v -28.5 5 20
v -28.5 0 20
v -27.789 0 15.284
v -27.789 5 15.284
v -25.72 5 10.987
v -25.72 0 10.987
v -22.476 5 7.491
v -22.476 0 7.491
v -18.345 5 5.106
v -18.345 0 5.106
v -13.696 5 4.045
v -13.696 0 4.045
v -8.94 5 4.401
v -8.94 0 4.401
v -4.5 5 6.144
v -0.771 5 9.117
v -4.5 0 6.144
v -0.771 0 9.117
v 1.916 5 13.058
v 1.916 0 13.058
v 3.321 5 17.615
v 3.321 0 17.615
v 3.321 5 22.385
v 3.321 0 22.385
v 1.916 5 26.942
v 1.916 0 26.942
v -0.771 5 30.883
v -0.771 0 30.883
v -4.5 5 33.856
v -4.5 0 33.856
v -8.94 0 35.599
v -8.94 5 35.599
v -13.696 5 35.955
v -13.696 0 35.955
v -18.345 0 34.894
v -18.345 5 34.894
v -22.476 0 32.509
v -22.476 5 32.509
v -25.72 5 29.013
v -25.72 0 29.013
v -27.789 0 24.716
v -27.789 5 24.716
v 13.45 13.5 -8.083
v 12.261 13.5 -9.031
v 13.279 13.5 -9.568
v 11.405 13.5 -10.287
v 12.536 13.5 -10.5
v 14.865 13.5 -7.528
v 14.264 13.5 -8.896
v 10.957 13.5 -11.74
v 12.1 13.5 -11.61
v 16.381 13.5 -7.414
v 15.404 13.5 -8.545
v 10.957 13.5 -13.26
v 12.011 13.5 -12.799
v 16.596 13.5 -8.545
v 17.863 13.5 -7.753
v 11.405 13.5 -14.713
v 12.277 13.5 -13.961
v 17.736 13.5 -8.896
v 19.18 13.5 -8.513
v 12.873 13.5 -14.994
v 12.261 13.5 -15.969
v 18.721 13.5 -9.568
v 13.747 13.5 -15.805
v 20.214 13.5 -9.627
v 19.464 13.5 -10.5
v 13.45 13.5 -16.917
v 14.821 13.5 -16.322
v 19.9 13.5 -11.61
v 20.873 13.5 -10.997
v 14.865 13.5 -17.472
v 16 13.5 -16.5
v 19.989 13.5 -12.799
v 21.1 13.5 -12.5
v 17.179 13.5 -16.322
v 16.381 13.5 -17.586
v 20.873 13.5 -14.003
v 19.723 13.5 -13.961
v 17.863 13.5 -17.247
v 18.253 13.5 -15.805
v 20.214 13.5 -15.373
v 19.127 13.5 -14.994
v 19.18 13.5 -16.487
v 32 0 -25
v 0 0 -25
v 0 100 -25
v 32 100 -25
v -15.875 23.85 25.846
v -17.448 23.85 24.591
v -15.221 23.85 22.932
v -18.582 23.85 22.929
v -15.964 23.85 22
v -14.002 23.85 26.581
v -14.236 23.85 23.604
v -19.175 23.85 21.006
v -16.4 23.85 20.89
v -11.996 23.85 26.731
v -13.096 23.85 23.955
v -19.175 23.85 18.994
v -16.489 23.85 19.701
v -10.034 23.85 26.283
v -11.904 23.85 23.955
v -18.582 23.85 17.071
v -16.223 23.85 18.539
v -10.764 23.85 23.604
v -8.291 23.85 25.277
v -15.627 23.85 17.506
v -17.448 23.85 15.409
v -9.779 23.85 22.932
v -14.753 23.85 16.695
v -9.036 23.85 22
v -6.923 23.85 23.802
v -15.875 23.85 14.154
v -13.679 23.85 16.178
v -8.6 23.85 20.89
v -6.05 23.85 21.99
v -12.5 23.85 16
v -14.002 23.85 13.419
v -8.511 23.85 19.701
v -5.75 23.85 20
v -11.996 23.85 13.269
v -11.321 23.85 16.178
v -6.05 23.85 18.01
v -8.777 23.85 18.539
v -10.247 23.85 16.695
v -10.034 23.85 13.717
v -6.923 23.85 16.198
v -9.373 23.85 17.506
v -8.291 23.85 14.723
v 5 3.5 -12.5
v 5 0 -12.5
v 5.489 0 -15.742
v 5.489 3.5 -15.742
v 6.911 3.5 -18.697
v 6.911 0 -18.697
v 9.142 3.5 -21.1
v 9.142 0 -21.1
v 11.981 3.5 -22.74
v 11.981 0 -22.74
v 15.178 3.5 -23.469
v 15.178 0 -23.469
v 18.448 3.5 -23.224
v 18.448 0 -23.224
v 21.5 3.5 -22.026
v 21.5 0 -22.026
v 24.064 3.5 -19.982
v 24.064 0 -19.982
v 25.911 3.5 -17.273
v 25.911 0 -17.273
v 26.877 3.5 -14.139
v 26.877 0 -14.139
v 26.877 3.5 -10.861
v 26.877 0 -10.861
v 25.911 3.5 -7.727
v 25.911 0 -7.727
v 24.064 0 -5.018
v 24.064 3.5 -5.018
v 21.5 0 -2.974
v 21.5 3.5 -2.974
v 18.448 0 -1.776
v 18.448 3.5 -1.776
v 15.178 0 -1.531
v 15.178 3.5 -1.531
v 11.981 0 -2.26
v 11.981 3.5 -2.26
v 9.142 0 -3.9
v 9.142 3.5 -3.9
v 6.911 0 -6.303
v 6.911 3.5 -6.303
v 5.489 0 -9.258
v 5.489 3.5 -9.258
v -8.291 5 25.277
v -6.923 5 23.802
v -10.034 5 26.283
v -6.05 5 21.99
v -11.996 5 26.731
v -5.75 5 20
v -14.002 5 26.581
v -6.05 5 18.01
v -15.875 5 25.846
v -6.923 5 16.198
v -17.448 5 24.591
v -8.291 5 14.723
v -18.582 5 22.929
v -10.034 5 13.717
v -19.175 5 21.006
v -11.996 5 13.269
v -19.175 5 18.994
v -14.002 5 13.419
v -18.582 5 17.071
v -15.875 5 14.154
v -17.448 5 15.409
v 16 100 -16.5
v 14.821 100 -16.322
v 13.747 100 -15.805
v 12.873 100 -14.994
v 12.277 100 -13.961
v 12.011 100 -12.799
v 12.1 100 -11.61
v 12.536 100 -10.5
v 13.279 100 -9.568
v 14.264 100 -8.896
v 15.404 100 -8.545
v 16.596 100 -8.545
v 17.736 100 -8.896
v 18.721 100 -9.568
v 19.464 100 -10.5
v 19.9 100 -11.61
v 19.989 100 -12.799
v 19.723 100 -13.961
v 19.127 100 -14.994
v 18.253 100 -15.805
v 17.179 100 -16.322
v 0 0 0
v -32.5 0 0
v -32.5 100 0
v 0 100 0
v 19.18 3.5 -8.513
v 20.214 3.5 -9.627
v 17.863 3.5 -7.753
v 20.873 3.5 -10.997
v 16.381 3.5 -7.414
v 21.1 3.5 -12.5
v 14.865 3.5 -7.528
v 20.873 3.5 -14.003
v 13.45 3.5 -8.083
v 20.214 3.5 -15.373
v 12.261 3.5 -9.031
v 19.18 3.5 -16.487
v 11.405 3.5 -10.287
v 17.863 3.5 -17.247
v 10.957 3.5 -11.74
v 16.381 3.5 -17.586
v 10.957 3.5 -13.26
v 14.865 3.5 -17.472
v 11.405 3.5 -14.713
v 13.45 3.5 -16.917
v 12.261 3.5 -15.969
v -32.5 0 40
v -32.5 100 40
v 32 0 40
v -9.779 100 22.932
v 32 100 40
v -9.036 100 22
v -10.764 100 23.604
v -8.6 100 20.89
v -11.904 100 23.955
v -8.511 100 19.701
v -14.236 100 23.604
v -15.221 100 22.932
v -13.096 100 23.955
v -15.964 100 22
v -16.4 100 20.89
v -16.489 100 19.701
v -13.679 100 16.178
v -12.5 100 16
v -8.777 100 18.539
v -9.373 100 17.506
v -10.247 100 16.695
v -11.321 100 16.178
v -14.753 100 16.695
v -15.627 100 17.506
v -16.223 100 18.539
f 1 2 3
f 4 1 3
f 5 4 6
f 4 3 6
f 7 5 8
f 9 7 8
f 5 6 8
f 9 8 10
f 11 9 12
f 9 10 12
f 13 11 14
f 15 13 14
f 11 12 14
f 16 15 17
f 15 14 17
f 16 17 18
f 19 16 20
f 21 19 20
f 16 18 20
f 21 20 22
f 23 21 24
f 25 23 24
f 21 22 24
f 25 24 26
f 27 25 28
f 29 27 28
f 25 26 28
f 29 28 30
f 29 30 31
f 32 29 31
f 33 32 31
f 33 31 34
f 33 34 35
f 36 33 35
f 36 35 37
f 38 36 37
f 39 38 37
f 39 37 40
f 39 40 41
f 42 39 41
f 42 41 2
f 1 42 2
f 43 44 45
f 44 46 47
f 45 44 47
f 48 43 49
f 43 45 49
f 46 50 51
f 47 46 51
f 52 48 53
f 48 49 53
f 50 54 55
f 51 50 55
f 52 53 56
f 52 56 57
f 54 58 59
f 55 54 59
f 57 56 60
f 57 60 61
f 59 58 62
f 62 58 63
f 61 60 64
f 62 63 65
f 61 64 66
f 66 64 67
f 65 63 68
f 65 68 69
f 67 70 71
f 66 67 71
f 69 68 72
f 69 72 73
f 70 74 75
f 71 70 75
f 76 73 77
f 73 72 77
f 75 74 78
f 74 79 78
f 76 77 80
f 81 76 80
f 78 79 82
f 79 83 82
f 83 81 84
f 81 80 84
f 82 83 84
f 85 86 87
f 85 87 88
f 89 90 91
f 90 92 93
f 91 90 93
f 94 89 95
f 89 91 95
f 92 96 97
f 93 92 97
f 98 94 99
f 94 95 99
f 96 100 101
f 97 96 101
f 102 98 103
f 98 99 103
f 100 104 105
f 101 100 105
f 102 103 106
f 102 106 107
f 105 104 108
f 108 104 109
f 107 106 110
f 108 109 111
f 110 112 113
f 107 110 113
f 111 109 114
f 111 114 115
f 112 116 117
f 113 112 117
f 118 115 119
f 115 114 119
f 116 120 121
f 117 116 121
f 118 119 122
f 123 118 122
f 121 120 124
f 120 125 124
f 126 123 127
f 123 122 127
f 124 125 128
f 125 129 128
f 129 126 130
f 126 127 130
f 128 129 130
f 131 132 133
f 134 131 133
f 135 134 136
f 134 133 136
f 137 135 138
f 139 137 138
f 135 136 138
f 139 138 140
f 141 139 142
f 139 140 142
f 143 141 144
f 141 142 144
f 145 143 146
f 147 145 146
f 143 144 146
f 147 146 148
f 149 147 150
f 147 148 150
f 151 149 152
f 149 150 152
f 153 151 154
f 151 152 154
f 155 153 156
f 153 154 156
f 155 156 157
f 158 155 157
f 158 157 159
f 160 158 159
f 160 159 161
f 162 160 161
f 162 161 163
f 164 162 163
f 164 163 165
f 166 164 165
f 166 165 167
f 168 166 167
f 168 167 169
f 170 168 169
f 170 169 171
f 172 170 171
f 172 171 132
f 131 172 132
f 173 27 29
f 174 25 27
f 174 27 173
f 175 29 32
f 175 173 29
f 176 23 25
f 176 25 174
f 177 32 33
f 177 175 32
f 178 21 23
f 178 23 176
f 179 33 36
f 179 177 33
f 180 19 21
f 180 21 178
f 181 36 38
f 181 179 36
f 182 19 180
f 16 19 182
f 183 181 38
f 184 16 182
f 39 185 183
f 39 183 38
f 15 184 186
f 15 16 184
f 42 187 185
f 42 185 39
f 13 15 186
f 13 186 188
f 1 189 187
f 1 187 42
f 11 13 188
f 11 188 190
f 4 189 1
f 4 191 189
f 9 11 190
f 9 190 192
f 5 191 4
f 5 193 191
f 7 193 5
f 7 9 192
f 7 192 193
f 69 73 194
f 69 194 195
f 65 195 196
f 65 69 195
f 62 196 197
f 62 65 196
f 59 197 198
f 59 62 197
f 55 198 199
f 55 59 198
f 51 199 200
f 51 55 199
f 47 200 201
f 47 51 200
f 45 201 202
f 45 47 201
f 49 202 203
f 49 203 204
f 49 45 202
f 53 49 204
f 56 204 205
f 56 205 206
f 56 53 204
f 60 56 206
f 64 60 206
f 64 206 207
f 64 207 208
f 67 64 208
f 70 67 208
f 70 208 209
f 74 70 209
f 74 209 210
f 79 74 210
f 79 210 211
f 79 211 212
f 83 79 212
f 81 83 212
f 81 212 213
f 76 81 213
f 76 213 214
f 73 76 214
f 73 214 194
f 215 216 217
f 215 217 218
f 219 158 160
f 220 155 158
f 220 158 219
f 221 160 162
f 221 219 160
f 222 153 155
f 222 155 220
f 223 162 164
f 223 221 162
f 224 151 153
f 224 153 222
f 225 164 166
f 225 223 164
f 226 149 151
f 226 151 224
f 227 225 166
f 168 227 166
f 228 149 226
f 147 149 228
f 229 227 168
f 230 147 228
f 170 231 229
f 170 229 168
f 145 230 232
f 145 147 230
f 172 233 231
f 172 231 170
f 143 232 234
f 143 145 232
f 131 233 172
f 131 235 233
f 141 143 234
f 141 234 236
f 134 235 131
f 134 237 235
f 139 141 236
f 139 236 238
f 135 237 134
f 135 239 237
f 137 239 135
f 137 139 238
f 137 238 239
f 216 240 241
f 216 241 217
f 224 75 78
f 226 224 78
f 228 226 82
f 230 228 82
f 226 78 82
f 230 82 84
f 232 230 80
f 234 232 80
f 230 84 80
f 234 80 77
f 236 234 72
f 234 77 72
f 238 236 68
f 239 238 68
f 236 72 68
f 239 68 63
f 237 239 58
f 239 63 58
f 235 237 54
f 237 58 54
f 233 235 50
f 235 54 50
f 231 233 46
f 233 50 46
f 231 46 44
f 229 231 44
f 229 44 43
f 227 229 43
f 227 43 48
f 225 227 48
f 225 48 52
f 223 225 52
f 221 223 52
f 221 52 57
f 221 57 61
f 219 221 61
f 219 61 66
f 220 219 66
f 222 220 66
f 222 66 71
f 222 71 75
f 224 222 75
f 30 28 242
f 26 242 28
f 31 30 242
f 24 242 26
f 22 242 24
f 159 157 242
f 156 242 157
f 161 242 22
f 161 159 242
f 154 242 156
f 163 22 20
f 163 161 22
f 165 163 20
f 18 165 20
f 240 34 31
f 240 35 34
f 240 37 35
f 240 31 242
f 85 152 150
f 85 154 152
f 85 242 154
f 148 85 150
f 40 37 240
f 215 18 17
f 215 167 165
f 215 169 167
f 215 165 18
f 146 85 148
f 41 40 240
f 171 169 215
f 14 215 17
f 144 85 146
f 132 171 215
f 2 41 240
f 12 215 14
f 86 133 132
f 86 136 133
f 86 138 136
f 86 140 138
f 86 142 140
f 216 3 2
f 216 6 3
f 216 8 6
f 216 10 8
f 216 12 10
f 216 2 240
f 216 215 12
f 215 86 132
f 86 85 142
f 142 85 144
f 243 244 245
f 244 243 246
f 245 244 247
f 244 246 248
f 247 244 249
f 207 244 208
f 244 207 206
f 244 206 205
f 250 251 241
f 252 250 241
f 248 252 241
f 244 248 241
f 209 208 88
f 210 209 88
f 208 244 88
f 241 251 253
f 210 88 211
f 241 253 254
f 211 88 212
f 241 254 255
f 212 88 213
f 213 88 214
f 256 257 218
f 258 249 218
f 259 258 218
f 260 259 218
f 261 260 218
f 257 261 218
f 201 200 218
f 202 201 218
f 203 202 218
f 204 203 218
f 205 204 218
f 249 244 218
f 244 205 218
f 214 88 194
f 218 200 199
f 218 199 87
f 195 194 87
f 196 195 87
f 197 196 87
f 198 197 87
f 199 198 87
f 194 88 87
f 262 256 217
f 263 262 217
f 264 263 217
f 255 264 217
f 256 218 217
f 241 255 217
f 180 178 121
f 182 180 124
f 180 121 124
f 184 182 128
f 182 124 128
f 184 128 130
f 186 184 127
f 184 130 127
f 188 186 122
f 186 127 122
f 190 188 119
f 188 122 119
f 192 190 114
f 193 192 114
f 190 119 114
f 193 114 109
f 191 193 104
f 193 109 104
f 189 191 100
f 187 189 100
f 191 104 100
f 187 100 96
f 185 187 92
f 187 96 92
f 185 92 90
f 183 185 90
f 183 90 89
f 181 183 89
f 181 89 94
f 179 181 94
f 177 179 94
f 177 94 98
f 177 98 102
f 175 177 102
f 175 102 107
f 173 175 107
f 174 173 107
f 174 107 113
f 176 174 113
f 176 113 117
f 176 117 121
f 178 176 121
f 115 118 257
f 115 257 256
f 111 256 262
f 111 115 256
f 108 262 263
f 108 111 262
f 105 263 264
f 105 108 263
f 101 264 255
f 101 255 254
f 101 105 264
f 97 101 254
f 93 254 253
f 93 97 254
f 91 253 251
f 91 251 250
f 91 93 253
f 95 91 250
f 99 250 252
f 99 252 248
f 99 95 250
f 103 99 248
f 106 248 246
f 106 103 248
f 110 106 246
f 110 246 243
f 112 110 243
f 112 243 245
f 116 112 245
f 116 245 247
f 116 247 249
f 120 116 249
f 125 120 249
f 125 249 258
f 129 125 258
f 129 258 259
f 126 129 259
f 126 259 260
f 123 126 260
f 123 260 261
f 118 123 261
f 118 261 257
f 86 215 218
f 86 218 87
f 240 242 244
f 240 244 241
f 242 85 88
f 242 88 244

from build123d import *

# Parameters (mm, degrees)
SKETCH1_R                               = 4
BOSS_EXTRUDE1_DEPTH                     = 100
CBORE_FOR_M5_HEX_HEAD_BOLT2_D           = 13.5
CBORE_FOR_M5_HEX_HEAD_BOLT2_DEPTH       = 23.85
CBORE_FOR_M5_HEX_HEAD_BOLT2_CBORE_D     = 32
CBORE_FOR_M5_HEX_HEAD_BOLT2_CBORE_DEPTH = 5
CBORE_FOR_M5_HEX_HEAD_BOLT3_D           = 10.2
CBORE_FOR_M5_HEX_HEAD_BOLT3_DEPTH       = 13.5
CBORE_FOR_M5_HEX_HEAD_BOLT3_CBORE_D     = 22
CBORE_FOR_M5_HEX_HEAD_BOLT3_CBORE_DEPTH = 3.5


with BuildPart() as part:
    # Sketch1 → Boss-Extrude1 (new body)
    with BuildSketch(Plane(origin=(0, 0, 0), x_dir=(1, 0, 0), z_dir=(0, 1, 0))):
        Polygon((-32.5, 0), (0, 0), (0, 25), (32, 25), (32, -40), (-32.5, -40), align=None)
        with Locations(Location((-12.5, -20, 0), (0, 0, 90))):
            Circle(SKETCH1_R, mode=Mode.SUBTRACT)
        with Locations(Location((16, 12.5, 0), (0, 0, 90))):
            Circle(SKETCH1_R, mode=Mode.SUBTRACT)
    extrude(amount=BOSS_EXTRUDE1_DEPTH)

    # CBORE for M5 Hex Head Bolt2
    with Locations(Plane(origin=(0, 0, 0), x_dir=(-1, 0, 0), z_dir=(0, -1, 0))):
        with Locations((12.5, -20)):
            CounterBoreHole(CBORE_FOR_M5_HEX_HEAD_BOLT2_D / 2, CBORE_FOR_M5_HEX_HEAD_BOLT2_CBORE_D / 2, CBORE_FOR_M5_HEX_HEAD_BOLT2_CBORE_DEPTH, depth=CBORE_FOR_M5_HEX_HEAD_BOLT2_DEPTH)

    # CBORE for M5 Hex Head Bolt3
    with Locations(Plane(origin=(0, 0, 0), x_dir=(-1, 0, 0), z_dir=(0, -1, 0))):
        with Locations((-16, 12.5)):
            CounterBoreHole(CBORE_FOR_M5_HEX_HEAD_BOLT3_D / 2, CBORE_FOR_M5_HEX_HEAD_BOLT3_CBORE_D / 2, CBORE_FOR_M5_HEX_HEAD_BOLT3_CBORE_DEPTH, depth=CBORE_FOR_M5_HEX_HEAD_BOLT3_DEPTH)


solid = part.part
